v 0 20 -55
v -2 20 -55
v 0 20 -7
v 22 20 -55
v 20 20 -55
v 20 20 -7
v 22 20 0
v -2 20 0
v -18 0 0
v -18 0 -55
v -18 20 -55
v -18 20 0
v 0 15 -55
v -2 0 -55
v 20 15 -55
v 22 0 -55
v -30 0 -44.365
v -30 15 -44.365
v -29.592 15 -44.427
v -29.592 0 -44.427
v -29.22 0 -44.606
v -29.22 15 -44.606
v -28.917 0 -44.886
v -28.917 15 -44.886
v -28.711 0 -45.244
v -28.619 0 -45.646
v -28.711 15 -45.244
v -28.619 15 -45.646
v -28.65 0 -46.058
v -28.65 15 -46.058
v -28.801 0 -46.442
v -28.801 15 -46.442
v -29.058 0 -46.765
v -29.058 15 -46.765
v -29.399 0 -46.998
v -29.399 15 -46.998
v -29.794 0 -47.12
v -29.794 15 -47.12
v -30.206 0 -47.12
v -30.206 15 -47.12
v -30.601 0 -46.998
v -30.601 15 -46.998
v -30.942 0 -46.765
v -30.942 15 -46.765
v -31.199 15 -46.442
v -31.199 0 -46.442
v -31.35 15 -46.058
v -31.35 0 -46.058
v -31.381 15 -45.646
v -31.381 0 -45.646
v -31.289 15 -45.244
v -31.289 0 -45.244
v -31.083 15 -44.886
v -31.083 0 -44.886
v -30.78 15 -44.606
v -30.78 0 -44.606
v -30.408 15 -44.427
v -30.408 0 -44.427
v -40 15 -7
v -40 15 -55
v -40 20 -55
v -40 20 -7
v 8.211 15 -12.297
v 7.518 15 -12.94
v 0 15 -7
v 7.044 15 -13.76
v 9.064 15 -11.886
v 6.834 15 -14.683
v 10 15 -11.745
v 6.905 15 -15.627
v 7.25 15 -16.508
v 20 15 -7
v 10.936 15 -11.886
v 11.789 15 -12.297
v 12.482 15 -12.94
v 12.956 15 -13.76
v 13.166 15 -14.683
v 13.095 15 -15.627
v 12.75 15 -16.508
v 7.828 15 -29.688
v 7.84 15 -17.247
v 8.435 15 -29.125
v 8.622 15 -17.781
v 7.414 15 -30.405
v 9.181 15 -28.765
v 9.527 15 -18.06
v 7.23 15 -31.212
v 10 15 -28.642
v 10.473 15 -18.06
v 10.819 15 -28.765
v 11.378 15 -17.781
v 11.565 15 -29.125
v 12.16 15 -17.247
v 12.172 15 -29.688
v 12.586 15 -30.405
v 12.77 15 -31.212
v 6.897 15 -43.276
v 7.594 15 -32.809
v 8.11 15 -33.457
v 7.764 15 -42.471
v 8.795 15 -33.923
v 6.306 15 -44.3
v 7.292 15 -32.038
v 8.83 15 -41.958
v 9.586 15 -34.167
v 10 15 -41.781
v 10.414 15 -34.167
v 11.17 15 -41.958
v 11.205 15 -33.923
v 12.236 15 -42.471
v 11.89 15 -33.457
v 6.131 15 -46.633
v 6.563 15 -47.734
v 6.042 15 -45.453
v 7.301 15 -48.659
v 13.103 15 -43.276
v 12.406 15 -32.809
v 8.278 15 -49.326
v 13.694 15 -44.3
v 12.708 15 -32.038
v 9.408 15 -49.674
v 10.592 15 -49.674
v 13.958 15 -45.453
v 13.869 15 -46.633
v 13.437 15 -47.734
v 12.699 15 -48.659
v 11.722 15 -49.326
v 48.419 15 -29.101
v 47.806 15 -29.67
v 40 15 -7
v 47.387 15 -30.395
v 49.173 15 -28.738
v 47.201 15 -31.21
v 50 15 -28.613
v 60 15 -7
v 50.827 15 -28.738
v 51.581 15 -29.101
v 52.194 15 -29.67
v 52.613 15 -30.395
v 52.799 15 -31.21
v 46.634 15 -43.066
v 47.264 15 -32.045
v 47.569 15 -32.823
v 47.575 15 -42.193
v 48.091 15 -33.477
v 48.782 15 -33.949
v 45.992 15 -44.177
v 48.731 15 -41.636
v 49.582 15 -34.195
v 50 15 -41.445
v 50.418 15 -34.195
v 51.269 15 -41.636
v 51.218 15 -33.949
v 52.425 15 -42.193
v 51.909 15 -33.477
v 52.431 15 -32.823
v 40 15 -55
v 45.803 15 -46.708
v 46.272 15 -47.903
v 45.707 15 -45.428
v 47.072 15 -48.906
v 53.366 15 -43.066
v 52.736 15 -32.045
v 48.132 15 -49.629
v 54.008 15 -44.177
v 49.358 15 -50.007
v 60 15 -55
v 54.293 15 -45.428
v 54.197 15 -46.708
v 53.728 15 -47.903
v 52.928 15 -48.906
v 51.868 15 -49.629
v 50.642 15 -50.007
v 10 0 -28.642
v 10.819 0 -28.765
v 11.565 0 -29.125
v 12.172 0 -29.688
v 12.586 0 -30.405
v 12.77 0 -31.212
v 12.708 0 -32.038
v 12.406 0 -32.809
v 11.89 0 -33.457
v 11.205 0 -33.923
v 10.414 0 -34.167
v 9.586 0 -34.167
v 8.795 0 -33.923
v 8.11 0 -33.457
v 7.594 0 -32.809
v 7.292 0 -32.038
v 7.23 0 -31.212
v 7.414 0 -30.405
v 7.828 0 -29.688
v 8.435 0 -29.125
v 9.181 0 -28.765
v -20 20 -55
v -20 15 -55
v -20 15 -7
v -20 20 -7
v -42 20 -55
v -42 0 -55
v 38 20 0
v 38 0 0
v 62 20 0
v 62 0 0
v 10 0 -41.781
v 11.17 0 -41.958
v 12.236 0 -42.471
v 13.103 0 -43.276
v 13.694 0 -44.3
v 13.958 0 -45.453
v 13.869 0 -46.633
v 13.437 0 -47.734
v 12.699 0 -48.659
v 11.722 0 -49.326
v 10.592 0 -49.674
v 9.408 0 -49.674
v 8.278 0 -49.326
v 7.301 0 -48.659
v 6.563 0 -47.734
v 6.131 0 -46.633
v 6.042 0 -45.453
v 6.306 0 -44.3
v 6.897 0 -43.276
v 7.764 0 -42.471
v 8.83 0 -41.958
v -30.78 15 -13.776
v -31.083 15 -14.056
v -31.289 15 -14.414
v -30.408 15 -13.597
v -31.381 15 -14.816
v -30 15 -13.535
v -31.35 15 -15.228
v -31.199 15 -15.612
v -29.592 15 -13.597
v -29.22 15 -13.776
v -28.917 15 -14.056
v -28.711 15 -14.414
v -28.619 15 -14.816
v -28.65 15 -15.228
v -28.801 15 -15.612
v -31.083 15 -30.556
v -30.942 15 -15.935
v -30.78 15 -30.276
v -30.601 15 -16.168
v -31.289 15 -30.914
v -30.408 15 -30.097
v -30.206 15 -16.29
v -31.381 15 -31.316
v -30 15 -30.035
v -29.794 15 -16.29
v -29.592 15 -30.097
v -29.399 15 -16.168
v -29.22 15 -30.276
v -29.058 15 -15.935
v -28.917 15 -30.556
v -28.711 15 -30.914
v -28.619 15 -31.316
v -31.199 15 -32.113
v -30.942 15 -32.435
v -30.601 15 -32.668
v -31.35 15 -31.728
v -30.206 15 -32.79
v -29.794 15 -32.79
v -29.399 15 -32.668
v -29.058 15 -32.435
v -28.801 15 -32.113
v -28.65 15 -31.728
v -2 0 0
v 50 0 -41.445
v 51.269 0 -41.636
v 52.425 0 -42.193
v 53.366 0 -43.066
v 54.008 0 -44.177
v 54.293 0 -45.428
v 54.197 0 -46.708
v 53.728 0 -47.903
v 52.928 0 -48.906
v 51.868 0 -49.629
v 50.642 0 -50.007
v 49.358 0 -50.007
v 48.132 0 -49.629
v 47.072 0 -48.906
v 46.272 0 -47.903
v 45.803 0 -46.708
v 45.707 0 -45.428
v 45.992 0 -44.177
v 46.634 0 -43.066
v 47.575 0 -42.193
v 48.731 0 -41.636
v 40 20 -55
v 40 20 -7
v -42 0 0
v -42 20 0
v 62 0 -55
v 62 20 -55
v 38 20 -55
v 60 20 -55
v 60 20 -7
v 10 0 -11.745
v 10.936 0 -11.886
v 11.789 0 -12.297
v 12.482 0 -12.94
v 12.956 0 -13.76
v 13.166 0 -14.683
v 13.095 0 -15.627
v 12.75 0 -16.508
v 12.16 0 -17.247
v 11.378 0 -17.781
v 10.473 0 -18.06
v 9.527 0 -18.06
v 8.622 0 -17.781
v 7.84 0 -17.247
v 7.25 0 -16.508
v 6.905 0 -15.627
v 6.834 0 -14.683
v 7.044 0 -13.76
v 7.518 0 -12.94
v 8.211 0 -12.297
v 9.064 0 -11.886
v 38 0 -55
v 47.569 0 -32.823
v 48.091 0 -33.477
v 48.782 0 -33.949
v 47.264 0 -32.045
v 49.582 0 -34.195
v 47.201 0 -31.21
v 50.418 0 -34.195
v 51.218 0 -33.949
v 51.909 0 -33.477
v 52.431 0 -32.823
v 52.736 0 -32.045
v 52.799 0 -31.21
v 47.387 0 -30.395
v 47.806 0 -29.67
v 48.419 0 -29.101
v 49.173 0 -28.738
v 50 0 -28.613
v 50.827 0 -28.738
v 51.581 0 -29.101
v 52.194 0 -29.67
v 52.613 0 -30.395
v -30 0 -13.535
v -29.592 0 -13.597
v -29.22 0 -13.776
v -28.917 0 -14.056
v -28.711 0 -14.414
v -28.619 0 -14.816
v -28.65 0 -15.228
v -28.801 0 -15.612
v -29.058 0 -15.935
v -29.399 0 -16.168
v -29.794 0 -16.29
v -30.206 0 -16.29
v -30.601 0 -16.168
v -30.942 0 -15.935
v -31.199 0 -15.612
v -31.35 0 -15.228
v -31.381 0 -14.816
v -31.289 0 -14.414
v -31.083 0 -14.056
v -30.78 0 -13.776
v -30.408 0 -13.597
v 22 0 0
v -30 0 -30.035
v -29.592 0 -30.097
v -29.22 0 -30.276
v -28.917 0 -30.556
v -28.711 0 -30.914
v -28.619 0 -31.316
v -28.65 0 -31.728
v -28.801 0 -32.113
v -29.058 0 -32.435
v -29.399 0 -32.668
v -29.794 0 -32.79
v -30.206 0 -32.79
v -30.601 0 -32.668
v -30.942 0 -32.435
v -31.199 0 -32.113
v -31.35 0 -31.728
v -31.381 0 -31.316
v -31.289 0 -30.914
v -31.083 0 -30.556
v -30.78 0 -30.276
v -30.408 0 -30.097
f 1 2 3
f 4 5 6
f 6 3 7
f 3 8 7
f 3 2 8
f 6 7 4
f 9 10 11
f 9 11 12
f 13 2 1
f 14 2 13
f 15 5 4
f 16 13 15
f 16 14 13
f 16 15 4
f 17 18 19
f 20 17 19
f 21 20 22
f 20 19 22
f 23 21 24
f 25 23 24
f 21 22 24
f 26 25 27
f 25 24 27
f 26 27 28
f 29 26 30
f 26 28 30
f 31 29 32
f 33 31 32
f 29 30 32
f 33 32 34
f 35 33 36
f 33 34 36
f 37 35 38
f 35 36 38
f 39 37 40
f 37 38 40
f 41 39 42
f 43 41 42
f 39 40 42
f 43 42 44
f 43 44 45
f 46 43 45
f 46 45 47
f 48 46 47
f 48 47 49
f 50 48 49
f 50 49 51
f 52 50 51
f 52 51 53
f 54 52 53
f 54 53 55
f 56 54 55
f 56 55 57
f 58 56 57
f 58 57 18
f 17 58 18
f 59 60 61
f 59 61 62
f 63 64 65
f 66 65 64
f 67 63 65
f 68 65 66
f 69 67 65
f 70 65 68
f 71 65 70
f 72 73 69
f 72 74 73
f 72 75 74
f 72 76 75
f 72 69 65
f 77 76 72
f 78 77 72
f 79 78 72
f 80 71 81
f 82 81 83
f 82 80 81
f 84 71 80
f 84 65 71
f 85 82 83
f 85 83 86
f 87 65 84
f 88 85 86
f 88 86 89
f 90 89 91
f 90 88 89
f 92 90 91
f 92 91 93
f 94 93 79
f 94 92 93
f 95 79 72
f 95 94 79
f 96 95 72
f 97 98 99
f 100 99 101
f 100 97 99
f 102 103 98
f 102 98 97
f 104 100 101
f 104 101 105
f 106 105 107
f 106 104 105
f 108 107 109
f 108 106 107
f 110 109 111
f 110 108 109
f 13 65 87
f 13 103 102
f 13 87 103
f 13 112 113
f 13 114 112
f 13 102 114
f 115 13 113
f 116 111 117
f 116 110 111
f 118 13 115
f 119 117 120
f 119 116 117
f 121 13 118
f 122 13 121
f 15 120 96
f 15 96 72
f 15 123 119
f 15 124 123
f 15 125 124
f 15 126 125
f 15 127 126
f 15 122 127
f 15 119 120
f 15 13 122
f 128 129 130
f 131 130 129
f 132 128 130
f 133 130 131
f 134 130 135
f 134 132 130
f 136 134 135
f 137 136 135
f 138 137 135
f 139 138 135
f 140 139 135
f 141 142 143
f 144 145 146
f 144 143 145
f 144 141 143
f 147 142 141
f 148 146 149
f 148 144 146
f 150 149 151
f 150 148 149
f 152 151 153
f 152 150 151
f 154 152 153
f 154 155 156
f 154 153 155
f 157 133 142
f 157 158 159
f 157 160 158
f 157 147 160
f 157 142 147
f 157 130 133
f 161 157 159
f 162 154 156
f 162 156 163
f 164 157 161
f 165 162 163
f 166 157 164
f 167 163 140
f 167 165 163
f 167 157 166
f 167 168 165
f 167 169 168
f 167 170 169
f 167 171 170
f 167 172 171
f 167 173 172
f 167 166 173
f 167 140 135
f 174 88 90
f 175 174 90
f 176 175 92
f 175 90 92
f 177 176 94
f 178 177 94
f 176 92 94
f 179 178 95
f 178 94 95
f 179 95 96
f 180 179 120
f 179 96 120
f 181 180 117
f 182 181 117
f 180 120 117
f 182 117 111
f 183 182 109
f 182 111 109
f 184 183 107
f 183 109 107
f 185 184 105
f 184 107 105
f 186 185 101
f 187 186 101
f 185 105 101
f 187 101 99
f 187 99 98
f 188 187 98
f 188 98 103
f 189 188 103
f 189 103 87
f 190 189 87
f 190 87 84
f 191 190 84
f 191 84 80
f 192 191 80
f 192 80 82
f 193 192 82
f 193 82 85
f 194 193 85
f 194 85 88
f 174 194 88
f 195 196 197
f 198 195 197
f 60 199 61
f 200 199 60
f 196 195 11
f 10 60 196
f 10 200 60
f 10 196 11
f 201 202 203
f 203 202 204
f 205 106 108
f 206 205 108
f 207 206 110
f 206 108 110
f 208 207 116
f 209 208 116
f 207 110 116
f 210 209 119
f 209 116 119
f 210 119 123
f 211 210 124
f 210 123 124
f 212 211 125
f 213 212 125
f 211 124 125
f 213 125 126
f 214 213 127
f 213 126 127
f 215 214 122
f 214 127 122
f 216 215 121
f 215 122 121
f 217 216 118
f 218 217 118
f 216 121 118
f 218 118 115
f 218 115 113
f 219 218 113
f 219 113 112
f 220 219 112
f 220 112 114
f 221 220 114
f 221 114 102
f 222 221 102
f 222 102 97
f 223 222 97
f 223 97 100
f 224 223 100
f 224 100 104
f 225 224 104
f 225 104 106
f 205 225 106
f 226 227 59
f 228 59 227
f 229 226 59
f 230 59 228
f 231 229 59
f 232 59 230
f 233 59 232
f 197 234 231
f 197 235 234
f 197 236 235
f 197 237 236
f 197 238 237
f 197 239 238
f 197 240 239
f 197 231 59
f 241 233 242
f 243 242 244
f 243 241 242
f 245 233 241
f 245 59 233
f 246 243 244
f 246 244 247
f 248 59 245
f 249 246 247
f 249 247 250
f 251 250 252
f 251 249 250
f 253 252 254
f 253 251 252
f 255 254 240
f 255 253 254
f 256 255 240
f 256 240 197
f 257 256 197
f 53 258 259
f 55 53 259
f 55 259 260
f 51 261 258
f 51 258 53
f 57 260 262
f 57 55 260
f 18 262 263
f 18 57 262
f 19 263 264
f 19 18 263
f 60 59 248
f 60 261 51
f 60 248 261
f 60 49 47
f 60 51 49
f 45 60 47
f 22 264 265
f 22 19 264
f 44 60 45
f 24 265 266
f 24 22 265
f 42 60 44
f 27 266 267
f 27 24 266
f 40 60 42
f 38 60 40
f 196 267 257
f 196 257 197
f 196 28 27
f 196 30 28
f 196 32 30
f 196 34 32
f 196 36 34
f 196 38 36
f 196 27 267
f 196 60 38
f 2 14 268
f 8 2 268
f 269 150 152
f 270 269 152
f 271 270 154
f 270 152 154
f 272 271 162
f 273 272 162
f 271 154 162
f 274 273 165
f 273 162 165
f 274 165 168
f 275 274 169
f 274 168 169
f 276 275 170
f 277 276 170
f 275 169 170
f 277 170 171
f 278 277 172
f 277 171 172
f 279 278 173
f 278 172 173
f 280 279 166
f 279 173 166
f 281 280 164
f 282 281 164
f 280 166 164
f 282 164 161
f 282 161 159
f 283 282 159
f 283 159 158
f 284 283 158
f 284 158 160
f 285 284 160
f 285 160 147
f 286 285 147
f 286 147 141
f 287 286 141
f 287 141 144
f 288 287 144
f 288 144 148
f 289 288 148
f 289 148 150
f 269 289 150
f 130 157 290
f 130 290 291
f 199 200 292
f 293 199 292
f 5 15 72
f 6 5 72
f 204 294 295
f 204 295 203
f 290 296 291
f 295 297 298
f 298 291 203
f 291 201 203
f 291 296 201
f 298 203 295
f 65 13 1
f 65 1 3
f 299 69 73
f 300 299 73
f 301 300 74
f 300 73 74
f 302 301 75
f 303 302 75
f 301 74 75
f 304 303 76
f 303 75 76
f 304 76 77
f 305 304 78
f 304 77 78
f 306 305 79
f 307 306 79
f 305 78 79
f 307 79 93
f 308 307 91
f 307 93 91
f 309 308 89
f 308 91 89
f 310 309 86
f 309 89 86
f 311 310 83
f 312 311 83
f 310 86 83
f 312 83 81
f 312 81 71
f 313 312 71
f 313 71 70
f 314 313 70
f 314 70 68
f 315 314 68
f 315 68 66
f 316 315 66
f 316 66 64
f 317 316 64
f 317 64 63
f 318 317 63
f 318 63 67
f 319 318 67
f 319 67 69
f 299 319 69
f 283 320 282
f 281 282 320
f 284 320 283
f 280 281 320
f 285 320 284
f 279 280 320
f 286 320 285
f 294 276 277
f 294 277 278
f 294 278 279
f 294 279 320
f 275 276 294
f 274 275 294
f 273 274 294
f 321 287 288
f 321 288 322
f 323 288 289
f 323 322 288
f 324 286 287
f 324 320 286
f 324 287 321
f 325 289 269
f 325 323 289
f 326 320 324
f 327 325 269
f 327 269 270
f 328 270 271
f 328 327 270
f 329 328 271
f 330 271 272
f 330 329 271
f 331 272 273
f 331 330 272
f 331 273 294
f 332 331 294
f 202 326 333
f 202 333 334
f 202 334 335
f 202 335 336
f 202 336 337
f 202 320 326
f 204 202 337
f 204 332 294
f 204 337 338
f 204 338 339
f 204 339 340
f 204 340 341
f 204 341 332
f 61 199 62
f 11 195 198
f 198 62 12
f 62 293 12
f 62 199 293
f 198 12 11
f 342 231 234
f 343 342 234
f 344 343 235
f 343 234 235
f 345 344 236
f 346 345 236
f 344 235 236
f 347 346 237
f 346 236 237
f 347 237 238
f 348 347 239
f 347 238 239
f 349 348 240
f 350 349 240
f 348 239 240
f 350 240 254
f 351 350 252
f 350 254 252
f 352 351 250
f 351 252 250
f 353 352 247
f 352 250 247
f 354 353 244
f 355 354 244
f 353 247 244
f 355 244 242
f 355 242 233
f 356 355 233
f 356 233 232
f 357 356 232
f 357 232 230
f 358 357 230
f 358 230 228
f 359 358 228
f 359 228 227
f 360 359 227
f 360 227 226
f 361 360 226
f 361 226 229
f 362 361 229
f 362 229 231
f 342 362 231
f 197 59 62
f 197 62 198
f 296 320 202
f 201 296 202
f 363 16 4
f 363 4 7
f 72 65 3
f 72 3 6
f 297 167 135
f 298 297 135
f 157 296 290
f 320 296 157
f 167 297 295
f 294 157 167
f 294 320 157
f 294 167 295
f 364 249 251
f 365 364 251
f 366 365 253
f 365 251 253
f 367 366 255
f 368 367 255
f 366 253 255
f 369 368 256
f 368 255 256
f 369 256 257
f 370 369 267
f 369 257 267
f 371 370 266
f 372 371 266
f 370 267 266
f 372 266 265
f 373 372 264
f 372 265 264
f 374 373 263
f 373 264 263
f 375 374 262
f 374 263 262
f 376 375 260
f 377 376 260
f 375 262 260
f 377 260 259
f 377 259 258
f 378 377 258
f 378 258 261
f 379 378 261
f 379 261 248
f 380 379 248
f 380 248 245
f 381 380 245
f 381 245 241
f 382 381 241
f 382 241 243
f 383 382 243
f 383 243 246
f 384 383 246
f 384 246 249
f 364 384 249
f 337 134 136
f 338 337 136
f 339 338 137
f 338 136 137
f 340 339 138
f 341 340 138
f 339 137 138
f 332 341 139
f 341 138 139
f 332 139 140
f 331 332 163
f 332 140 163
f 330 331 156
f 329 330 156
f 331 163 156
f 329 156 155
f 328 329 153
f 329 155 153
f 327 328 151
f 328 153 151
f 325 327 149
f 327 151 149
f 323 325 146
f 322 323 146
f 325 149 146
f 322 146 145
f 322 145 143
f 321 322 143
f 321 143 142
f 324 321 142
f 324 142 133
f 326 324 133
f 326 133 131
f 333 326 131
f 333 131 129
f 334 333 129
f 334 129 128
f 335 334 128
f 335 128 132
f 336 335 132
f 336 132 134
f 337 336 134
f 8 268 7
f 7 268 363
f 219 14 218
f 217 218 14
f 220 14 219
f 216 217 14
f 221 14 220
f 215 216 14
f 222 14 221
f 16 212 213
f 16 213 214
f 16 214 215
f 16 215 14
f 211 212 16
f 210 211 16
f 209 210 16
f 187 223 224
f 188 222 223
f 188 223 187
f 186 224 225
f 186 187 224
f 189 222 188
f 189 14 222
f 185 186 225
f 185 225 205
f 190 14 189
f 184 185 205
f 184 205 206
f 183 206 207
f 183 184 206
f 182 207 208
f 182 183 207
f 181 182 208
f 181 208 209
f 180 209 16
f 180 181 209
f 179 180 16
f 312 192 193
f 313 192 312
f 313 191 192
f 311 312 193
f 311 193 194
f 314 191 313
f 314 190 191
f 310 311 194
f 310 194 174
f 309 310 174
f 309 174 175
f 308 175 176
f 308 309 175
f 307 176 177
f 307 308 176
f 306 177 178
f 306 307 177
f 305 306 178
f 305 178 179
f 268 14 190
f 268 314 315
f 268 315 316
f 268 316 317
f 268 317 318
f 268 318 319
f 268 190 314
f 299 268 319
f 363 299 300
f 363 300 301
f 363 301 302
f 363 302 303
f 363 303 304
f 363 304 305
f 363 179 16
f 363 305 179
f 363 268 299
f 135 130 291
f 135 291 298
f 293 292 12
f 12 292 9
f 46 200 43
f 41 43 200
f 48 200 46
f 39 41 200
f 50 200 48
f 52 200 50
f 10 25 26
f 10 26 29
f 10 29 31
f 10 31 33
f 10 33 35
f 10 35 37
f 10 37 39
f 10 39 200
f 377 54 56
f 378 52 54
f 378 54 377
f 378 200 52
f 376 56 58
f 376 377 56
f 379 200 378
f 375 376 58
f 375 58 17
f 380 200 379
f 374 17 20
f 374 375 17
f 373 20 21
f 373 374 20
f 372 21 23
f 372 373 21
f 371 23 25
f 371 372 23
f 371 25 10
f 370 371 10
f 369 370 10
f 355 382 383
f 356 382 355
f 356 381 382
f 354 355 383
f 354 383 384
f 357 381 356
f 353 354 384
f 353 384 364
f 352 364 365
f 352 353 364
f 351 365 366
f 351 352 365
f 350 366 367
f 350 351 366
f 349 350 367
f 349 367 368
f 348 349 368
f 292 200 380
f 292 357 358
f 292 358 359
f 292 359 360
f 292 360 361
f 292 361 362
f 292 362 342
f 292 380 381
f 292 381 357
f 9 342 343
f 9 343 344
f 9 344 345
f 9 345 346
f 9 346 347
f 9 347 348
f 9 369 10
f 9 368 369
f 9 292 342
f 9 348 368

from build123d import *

# Parameters (mm, degrees)
SKETCH1_W             = 20
SKETCH1_H             = 55
BOSS_EXTRUDE1_DEPTH   = 15
BOSS_EXTRUDE1_2_DEPTH = 15
BOSS_EXTRUDE1_3_DEPTH = 15
SKETCH2_R             = 1.385
SKETCH2_R_2           = 4.3053
SKETCH2_R_3           = 2.8067
SKETCH2_R_4           = 3.175
SKETCH2_R_5           = 2.778125
SKETCH2_R_6           = 3.96875
CUT_EXTRUDE1_DEPTH    = 83.764726786
SKETCH3_W             = 20
SKETCH3_H             = 7
BOSS_EXTRUDE2_DEPTH   = 5
SKETCH4_W             = 2
SKETCH4_H             = 55
BOSS_EXTRUDE3_DEPTH   = 20


with BuildPart() as part:
    # Sketch1 → Boss-Extrude1 (new body)
    with BuildSketch(Plane(origin=(0, 0, 0), x_dir=(1, 0, 0), z_dir=(0, 1, 0))):
        with Locations((10, 27.5)):
            Rectangle(SKETCH1_W, SKETCH1_H)
    extrude(amount=BOSS_EXTRUDE1_DEPTH)


with BuildPart() as body_2:
    # Sketch1 → Boss-Extrude1 2 (new body)
    with BuildSketch(Plane(origin=(0, 0, 0), x_dir=(1, 0, 0), z_dir=(0, 1, 0))):
        with Locations((50, 27.5)):
            Rectangle(SKETCH1_W, SKETCH1_H)
    extrude(amount=BOSS_EXTRUDE1_2_DEPTH)


with BuildPart() as body_3:
    # Sketch1 → Boss-Extrude1 3 (new body)
    with BuildSketch(Plane(origin=(0, 0, 0), x_dir=(1, 0, 0), z_dir=(0, 1, 0))):
        with Locations((-30, 27.5)):
            Rectangle(SKETCH1_W, SKETCH1_H)
    extrude(amount=BOSS_EXTRUDE1_3_DEPTH)


with BuildPart() as cut_extrude1_tool:
    # Sketch2 → Cut-Extrude1 (new, through all)
    with BuildSketch(Plane(origin=(0, 15, 0), x_dir=(1, 0, 0), z_dir=(0, 1, 0))):
        with Locations(Location((-30, 45.75, 0), (0, 0, 270))):
            Circle(SKETCH2_R)
        with Locations(Location((-30, 31.42, 0), (0, 0, 270))):
            Circle(SKETCH2_R)
        with Locations(Location((-30, 14.92, 0), (0, 0, 270))):
            Circle(SKETCH2_R)
        with Locations(Location((50, 45.75, 0), (0, 0, 270))):
            Circle(SKETCH2_R_2)
        with Locations(Location((50, 31.42, 0), (0, 0, 270))):
            Circle(SKETCH2_R_3)
        with Locations(Location((10, 14.92, 0), (0, 0, 270))):
            Circle(SKETCH2_R_4)
        with Locations(Location((10, 31.42, 0), (0, 0, 270))):
            Circle(SKETCH2_R_5)
        with Locations(Location((10, 45.75, 0), (0, 0, 270))):
            Circle(SKETCH2_R_6)
    extrude(amount=-CUT_EXTRUDE1_DEPTH)


with BuildPart() as part_1:
    add(part.part)

    # Cut-Extrude1: cut by cut_extrude1_tool
    add(cut_extrude1_tool.part, mode=Mode.SUBTRACT)



with BuildPart() as body_2_1:
    add(body_2.part)

    # Cut-Extrude1: cut by cut_extrude1_tool
    add(cut_extrude1_tool.part, mode=Mode.SUBTRACT)


with BuildPart() as body_3_1:
    add(body_3.part)

    # Cut-Extrude1: cut by cut_extrude1_tool
    add(cut_extrude1_tool.part, mode=Mode.SUBTRACT)


with BuildPart() as part_2:
    add(part_1.part)

    add(body_2_1.part)  # Boss-Extrude2 merges body 2

    add(body_3_1.part)  # Boss-Extrude2 merges body 3
    # Sketch3 → Boss-Extrude2 (add)
    with BuildSketch(Plane(origin=(0, 15, 0), x_dir=(1, 0, 0), z_dir=(0, 1, 0))):
        with Locations((-30, 3.5)):
            Rectangle(SKETCH3_W, SKETCH3_H)
        with Locations((10, 3.5)):
            Rectangle(SKETCH3_W, SKETCH3_H)
        with Locations((50, 3.5)):
            Rectangle(SKETCH3_W, SKETCH3_H)
    extrude(amount=BOSS_EXTRUDE2_DEPTH)

    # Sketch4 → Boss-Extrude3 (add)
    with BuildSketch(Plane.XZ):
        with Locations((-41, -27.5)):
            Rectangle(SKETCH4_W, SKETCH4_H)
        with Locations((-19, -27.5)):
            Rectangle(SKETCH4_W, SKETCH4_H)
        with Locations((-1, -27.5)):
            Rectangle(SKETCH4_W, SKETCH4_H)
        with Locations((21, -27.5)):
            Rectangle(SKETCH4_W, SKETCH4_H)
        with Locations((39, -27.5)):
            Rectangle(SKETCH4_W, SKETCH4_H)
        with Locations((61, -27.5)):
            Rectangle(SKETCH4_W, SKETCH4_H)
    extrude(amount=-BOSS_EXTRUDE3_DEPTH)


solid = part_2.part
